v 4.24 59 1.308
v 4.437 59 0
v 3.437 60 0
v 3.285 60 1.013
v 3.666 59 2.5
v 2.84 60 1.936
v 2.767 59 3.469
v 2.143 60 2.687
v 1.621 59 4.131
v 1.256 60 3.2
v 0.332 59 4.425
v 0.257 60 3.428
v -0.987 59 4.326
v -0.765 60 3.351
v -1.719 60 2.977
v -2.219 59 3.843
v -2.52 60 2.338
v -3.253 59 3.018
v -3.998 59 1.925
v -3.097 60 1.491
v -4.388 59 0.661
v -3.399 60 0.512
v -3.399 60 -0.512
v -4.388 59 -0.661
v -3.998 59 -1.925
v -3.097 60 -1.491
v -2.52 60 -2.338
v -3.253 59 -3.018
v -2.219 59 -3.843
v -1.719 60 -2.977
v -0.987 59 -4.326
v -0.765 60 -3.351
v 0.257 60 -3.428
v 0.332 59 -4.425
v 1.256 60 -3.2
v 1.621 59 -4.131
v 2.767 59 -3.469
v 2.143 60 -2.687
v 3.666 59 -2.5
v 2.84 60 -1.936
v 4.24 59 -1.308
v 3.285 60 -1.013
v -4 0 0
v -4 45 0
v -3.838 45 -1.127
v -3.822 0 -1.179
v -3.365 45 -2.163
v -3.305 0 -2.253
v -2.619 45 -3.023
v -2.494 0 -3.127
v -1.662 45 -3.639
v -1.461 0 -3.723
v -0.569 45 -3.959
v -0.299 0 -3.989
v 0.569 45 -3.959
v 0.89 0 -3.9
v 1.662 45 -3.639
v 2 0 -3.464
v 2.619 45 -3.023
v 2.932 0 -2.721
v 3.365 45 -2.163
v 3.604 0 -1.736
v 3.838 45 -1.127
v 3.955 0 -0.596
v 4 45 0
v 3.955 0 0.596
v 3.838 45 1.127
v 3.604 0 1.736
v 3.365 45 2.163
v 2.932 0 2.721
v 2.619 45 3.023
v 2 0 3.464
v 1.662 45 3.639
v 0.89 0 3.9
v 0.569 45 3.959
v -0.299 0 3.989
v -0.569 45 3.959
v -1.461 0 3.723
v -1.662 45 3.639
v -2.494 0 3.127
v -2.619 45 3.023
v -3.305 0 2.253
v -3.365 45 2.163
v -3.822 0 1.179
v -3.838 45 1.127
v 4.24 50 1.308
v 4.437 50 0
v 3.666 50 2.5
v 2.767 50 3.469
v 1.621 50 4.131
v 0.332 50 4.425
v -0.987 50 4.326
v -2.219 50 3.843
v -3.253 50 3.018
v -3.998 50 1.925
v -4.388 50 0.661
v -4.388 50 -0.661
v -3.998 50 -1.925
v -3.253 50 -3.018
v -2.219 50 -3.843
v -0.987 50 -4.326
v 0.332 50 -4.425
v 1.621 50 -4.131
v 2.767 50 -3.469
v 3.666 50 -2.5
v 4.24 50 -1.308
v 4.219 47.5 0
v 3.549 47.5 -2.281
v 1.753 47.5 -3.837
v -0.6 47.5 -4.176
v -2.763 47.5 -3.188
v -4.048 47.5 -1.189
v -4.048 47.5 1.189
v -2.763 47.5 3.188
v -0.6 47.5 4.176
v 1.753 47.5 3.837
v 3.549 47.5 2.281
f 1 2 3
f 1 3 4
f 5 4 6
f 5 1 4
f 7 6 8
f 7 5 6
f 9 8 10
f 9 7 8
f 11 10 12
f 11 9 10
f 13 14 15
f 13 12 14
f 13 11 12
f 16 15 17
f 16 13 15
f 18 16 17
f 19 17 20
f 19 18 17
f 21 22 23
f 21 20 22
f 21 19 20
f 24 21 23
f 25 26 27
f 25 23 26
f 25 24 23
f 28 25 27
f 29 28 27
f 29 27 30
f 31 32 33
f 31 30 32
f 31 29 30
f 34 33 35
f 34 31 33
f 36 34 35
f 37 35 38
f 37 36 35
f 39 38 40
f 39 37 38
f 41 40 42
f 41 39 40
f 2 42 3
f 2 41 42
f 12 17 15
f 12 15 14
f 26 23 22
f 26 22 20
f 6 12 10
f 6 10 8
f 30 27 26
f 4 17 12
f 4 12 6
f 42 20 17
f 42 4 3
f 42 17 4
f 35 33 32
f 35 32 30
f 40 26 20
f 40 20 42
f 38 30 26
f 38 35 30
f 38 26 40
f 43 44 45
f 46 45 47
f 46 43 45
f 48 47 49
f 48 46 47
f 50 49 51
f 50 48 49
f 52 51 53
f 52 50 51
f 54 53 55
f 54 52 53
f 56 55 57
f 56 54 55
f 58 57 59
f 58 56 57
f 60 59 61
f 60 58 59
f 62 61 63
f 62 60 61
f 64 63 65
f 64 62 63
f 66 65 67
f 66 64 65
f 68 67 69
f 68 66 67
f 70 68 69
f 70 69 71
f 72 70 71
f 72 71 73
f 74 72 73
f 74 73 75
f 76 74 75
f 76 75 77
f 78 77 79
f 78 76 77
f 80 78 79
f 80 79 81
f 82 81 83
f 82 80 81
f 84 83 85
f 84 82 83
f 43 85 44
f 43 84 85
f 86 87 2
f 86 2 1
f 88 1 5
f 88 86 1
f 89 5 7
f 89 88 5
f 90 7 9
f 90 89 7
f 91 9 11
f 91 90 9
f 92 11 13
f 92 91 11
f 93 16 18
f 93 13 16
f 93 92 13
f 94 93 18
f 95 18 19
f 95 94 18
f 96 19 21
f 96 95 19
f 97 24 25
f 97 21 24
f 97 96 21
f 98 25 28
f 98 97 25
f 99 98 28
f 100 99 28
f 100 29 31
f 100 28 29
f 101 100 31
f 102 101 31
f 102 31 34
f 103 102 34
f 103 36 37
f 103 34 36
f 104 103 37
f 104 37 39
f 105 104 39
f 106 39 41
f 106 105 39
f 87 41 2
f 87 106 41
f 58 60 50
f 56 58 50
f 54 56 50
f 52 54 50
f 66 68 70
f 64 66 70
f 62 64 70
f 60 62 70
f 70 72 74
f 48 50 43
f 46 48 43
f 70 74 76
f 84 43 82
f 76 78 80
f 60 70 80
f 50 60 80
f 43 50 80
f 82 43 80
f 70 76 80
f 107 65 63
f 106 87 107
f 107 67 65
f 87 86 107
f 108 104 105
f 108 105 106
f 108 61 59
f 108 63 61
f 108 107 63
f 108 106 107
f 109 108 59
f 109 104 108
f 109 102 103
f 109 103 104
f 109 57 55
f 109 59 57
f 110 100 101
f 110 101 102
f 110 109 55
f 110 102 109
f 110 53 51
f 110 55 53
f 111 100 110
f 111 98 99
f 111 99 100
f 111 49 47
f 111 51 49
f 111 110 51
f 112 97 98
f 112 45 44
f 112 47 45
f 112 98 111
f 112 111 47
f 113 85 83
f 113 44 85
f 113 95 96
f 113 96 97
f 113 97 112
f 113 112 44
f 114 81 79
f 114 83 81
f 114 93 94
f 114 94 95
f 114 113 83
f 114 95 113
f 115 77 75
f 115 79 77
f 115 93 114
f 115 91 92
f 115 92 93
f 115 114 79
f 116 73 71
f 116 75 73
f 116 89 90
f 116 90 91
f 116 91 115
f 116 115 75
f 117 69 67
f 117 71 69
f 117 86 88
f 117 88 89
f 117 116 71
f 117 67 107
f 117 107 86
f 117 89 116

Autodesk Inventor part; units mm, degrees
ref_plane "YZ Plane" through (0, 0, 0) normal (1, 0, 0) x (0, 1, 0)
ref_plane "XZ Plane" through (0, 0, 0) normal (0, 1, 0) x (-1, 0, 0)
ref_plane "XY Plane" through (0, 0, 0) normal (0, 0, 1) x (1, 0, 0)
sketch "Sketch1" plane through (0, 0, 0) normal (0, 1, 0) x (-1, 0, 0)
  circle A0 centre (0, 0) radius 4
  dimension "d0" = 8
extrude "Extrusion1" add sketch "Sketch1" along normal blind 45
sketch "Sketch2" plane through (0, 45, 0) normal (0, 1, 0) x (1, 0, 0)
  circle A0 centre (0, 0) radius 4 projected
extrude "Extrusion2" add sketch "Sketch2" along normal blind 5 draft 5
sketch "Sketch3" plane through (0, 50, 0) normal (0, 1, 0) x (1, 0, 0)
  circle A0 centre (0, 0) radius 4.4374 projected
extrude "Extrusion3" add sketch "Sketch3" along normal blind 10
chamfer "Chamfer1" distance 1 angle 45 1 edges at (-4.4374, 60, 0)
properties part number "Handbar"
